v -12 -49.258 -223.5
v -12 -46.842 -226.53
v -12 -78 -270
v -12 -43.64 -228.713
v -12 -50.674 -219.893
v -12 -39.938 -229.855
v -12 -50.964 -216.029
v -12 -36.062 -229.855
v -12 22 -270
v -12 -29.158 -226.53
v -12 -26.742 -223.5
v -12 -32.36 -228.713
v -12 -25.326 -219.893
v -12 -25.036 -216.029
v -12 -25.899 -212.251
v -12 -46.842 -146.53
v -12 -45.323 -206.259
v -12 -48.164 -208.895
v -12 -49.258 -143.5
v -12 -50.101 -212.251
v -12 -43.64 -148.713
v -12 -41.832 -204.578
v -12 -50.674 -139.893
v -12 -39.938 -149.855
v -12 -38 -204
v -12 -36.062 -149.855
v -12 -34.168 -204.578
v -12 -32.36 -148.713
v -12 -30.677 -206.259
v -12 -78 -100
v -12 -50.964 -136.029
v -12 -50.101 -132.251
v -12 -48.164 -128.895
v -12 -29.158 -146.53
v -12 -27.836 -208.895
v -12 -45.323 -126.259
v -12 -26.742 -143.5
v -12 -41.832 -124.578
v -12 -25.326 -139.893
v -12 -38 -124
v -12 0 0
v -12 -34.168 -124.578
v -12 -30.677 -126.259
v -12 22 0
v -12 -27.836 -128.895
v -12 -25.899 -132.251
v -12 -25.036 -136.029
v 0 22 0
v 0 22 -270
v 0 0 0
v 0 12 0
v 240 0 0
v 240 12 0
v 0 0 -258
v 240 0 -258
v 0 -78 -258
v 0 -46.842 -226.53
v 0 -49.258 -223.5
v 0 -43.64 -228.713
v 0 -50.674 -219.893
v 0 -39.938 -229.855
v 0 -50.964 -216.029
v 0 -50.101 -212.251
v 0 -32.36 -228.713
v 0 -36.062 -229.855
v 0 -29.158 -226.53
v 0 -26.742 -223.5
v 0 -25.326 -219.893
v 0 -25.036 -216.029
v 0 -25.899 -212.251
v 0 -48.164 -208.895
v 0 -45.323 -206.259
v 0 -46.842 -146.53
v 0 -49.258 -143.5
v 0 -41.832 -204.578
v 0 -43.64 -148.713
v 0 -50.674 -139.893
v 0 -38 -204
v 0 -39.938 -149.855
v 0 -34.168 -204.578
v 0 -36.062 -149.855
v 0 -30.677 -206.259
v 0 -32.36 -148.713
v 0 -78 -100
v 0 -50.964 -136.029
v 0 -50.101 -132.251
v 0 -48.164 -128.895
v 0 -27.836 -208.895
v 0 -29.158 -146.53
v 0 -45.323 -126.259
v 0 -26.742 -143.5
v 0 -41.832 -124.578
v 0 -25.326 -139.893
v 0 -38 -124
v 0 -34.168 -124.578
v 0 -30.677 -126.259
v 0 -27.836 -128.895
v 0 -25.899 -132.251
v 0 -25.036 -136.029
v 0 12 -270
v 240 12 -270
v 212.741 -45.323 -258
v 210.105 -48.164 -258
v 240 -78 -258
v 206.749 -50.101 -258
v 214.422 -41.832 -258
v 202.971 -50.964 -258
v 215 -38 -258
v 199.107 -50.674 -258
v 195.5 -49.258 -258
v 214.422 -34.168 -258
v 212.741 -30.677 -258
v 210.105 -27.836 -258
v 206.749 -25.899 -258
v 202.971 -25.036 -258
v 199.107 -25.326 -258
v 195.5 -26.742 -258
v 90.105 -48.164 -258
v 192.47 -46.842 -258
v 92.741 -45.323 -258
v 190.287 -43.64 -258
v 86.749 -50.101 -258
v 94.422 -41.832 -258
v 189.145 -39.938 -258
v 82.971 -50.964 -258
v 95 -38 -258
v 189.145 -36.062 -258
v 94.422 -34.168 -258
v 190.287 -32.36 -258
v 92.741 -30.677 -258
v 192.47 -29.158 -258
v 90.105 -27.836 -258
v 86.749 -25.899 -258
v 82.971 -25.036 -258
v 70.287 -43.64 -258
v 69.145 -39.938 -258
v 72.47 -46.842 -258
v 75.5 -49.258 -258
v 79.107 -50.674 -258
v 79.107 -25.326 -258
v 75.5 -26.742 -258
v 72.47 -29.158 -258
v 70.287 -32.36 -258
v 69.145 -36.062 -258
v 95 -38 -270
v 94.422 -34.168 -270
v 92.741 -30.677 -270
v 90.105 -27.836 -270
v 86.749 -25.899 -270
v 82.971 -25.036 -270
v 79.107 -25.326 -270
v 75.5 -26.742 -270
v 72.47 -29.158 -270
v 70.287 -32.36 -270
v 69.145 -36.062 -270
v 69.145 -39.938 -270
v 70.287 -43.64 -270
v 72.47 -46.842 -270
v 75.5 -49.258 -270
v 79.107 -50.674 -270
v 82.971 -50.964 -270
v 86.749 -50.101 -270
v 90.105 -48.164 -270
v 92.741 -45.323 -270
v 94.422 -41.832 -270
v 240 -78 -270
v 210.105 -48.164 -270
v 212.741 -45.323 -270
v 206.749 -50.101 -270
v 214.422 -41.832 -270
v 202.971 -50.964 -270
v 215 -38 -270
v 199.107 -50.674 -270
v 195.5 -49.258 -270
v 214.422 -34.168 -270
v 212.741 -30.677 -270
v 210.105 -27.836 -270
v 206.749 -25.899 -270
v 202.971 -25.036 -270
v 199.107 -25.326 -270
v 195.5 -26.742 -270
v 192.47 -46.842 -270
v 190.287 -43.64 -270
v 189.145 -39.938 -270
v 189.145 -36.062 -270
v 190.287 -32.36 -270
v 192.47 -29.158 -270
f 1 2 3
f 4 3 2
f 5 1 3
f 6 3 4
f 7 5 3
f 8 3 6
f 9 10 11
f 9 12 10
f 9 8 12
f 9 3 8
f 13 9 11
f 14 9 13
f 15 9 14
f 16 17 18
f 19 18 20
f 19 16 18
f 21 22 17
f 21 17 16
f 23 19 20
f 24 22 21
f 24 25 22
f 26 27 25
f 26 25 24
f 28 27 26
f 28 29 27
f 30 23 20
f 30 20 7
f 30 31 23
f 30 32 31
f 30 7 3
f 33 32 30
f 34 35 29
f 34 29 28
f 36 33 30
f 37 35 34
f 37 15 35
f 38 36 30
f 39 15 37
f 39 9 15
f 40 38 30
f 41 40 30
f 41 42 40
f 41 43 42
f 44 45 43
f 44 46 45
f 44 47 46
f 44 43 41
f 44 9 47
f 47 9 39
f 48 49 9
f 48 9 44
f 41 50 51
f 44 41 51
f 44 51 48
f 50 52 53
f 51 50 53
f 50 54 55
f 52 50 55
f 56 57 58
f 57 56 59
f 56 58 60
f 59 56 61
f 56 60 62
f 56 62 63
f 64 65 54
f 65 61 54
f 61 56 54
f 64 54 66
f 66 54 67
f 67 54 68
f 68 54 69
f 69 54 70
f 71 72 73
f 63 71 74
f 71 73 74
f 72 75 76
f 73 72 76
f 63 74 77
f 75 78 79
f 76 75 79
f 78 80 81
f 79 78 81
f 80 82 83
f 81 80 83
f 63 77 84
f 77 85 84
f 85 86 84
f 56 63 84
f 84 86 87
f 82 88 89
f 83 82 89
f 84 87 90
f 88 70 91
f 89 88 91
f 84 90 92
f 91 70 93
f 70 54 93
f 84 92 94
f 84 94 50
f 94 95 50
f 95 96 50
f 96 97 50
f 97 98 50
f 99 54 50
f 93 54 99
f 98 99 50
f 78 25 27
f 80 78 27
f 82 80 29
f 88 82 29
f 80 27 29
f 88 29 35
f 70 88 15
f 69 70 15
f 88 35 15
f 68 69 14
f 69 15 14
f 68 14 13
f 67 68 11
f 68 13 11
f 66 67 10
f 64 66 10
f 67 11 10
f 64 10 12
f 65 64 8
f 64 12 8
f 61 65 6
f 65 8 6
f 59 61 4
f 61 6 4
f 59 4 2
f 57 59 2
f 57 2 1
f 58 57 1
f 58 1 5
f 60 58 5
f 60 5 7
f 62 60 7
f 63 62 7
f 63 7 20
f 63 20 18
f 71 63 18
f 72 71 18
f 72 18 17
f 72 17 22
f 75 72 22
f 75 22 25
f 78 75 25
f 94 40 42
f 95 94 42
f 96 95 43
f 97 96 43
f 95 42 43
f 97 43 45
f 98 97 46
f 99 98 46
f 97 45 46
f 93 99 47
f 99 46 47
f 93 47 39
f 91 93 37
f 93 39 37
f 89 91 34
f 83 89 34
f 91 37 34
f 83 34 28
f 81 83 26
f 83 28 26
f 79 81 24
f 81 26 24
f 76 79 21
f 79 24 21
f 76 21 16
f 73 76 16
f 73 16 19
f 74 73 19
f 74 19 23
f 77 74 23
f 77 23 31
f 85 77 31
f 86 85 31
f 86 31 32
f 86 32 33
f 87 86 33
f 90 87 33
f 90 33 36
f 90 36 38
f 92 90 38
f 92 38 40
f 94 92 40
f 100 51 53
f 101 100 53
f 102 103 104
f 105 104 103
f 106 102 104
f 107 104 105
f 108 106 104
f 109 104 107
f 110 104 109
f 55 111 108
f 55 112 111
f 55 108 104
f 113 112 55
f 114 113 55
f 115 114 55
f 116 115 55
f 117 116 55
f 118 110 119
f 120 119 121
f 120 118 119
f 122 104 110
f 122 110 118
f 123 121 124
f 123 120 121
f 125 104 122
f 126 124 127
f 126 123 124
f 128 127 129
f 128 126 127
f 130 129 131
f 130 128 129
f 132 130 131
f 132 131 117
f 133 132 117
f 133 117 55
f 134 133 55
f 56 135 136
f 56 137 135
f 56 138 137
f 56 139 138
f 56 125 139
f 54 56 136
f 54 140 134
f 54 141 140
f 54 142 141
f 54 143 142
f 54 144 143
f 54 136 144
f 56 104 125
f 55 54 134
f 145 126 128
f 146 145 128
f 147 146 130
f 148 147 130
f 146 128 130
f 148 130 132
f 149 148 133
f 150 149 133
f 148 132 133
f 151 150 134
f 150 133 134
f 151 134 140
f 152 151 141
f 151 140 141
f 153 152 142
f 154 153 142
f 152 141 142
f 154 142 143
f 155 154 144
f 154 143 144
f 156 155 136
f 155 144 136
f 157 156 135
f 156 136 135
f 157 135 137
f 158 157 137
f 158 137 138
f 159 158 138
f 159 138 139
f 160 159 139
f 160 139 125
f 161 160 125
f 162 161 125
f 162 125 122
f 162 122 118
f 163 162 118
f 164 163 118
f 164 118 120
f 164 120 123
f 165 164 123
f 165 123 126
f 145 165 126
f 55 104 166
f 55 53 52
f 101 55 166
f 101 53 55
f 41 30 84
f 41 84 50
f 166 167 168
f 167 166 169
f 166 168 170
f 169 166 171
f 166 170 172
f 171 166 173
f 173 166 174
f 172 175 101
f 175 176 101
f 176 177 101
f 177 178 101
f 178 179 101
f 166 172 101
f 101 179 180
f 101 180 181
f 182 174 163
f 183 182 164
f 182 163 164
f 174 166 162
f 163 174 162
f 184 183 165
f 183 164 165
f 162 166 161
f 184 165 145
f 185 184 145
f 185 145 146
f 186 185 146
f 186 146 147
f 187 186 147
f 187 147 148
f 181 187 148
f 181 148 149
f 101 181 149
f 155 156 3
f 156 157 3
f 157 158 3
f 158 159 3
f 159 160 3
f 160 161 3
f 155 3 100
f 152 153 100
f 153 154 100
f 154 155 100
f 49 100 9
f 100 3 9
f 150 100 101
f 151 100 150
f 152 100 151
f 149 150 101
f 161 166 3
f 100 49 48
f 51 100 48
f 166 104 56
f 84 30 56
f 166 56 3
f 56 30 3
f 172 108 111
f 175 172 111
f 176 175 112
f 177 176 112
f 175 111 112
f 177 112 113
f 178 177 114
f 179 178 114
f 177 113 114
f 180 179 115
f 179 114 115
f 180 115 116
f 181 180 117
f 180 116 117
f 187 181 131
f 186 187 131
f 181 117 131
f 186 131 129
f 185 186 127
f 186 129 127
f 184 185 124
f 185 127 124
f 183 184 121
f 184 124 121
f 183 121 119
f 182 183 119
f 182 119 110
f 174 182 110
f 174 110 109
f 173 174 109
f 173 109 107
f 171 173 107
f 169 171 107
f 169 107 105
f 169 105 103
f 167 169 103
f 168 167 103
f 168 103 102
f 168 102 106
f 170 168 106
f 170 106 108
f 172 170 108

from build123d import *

# Parameters (mm, degrees)
SKETCH_1_W          = 240
SKETCH_1_H          = 270
EXTRUDE_1_DEPTH     = 12
SKETCH_2_W          = 270
SKETCH_2_H          = 100
EXTRUDE_2_DEPTH     = 12
SKETCH_3_W          = 12
SKETCH_3_H          = 78
EXTRUDE_3_DEPTH     = 240
SKETCH_4_R          = 13
CUT_EXTRUDE_1_DEPTH = 361.898877804
SKETCH_5_R          = 13
CUT_EXTRUDE_2_DEPTH = 378.475827041


with BuildPart() as part:
    # 草图1 → 凸台-拉伸1 (new body)
    with BuildSketch(Plane(origin=(0, 0, 0), x_dir=(1, 0, 0), z_dir=(0, 1, 0))):
        with Locations((120, 135)):
            Rectangle(SKETCH_1_W, SKETCH_1_H)
    extrude(amount=EXTRUDE_1_DEPTH)

    # 草图2 → 凸台-拉伸2 (add)
    with BuildSketch(Plane.ZY):
        with Locations((-135, -28)):
            Rectangle(SKETCH_2_W, SKETCH_2_H)
    extrude(amount=EXTRUDE_2_DEPTH)

    # 草图3 → 凸台-拉伸3 (add)
    with BuildSketch(Plane(origin=(0, 0, 0), x_dir=(0, 0, -1), z_dir=(1, 0, 0))):
        with Locations((264, -39)):
            Rectangle(SKETCH_3_W, SKETCH_3_H)
    extrude(amount=EXTRUDE_3_DEPTH)

    # 草图4 → 切除-拉伸1 (cut, through all)
    with BuildSketch(Plane.XY.offset(-258)):
        with Locations((82, -38)):
            Circle(SKETCH_4_R)
        with Locations((202, -38)):
            Circle(SKETCH_4_R)
    extrude(amount=-CUT_EXTRUDE_1_DEPTH, mode=Mode.SUBTRACT)

    # 草图5 → 切除-拉伸2 (cut, through all)
    with BuildSketch(Plane.ZY.offset(12)):
        with Locations((-217, -38)):
            Circle(SKETCH_5_R)
        with Locations((-137, -38)):
            Circle(SKETCH_5_R)
        Polygon((-100, -78), (0, 0), (0, -78), align=None)
    extrude(amount=-CUT_EXTRUDE_2_DEPTH, mode=Mode.SUBTRACT)


solid = part.part
